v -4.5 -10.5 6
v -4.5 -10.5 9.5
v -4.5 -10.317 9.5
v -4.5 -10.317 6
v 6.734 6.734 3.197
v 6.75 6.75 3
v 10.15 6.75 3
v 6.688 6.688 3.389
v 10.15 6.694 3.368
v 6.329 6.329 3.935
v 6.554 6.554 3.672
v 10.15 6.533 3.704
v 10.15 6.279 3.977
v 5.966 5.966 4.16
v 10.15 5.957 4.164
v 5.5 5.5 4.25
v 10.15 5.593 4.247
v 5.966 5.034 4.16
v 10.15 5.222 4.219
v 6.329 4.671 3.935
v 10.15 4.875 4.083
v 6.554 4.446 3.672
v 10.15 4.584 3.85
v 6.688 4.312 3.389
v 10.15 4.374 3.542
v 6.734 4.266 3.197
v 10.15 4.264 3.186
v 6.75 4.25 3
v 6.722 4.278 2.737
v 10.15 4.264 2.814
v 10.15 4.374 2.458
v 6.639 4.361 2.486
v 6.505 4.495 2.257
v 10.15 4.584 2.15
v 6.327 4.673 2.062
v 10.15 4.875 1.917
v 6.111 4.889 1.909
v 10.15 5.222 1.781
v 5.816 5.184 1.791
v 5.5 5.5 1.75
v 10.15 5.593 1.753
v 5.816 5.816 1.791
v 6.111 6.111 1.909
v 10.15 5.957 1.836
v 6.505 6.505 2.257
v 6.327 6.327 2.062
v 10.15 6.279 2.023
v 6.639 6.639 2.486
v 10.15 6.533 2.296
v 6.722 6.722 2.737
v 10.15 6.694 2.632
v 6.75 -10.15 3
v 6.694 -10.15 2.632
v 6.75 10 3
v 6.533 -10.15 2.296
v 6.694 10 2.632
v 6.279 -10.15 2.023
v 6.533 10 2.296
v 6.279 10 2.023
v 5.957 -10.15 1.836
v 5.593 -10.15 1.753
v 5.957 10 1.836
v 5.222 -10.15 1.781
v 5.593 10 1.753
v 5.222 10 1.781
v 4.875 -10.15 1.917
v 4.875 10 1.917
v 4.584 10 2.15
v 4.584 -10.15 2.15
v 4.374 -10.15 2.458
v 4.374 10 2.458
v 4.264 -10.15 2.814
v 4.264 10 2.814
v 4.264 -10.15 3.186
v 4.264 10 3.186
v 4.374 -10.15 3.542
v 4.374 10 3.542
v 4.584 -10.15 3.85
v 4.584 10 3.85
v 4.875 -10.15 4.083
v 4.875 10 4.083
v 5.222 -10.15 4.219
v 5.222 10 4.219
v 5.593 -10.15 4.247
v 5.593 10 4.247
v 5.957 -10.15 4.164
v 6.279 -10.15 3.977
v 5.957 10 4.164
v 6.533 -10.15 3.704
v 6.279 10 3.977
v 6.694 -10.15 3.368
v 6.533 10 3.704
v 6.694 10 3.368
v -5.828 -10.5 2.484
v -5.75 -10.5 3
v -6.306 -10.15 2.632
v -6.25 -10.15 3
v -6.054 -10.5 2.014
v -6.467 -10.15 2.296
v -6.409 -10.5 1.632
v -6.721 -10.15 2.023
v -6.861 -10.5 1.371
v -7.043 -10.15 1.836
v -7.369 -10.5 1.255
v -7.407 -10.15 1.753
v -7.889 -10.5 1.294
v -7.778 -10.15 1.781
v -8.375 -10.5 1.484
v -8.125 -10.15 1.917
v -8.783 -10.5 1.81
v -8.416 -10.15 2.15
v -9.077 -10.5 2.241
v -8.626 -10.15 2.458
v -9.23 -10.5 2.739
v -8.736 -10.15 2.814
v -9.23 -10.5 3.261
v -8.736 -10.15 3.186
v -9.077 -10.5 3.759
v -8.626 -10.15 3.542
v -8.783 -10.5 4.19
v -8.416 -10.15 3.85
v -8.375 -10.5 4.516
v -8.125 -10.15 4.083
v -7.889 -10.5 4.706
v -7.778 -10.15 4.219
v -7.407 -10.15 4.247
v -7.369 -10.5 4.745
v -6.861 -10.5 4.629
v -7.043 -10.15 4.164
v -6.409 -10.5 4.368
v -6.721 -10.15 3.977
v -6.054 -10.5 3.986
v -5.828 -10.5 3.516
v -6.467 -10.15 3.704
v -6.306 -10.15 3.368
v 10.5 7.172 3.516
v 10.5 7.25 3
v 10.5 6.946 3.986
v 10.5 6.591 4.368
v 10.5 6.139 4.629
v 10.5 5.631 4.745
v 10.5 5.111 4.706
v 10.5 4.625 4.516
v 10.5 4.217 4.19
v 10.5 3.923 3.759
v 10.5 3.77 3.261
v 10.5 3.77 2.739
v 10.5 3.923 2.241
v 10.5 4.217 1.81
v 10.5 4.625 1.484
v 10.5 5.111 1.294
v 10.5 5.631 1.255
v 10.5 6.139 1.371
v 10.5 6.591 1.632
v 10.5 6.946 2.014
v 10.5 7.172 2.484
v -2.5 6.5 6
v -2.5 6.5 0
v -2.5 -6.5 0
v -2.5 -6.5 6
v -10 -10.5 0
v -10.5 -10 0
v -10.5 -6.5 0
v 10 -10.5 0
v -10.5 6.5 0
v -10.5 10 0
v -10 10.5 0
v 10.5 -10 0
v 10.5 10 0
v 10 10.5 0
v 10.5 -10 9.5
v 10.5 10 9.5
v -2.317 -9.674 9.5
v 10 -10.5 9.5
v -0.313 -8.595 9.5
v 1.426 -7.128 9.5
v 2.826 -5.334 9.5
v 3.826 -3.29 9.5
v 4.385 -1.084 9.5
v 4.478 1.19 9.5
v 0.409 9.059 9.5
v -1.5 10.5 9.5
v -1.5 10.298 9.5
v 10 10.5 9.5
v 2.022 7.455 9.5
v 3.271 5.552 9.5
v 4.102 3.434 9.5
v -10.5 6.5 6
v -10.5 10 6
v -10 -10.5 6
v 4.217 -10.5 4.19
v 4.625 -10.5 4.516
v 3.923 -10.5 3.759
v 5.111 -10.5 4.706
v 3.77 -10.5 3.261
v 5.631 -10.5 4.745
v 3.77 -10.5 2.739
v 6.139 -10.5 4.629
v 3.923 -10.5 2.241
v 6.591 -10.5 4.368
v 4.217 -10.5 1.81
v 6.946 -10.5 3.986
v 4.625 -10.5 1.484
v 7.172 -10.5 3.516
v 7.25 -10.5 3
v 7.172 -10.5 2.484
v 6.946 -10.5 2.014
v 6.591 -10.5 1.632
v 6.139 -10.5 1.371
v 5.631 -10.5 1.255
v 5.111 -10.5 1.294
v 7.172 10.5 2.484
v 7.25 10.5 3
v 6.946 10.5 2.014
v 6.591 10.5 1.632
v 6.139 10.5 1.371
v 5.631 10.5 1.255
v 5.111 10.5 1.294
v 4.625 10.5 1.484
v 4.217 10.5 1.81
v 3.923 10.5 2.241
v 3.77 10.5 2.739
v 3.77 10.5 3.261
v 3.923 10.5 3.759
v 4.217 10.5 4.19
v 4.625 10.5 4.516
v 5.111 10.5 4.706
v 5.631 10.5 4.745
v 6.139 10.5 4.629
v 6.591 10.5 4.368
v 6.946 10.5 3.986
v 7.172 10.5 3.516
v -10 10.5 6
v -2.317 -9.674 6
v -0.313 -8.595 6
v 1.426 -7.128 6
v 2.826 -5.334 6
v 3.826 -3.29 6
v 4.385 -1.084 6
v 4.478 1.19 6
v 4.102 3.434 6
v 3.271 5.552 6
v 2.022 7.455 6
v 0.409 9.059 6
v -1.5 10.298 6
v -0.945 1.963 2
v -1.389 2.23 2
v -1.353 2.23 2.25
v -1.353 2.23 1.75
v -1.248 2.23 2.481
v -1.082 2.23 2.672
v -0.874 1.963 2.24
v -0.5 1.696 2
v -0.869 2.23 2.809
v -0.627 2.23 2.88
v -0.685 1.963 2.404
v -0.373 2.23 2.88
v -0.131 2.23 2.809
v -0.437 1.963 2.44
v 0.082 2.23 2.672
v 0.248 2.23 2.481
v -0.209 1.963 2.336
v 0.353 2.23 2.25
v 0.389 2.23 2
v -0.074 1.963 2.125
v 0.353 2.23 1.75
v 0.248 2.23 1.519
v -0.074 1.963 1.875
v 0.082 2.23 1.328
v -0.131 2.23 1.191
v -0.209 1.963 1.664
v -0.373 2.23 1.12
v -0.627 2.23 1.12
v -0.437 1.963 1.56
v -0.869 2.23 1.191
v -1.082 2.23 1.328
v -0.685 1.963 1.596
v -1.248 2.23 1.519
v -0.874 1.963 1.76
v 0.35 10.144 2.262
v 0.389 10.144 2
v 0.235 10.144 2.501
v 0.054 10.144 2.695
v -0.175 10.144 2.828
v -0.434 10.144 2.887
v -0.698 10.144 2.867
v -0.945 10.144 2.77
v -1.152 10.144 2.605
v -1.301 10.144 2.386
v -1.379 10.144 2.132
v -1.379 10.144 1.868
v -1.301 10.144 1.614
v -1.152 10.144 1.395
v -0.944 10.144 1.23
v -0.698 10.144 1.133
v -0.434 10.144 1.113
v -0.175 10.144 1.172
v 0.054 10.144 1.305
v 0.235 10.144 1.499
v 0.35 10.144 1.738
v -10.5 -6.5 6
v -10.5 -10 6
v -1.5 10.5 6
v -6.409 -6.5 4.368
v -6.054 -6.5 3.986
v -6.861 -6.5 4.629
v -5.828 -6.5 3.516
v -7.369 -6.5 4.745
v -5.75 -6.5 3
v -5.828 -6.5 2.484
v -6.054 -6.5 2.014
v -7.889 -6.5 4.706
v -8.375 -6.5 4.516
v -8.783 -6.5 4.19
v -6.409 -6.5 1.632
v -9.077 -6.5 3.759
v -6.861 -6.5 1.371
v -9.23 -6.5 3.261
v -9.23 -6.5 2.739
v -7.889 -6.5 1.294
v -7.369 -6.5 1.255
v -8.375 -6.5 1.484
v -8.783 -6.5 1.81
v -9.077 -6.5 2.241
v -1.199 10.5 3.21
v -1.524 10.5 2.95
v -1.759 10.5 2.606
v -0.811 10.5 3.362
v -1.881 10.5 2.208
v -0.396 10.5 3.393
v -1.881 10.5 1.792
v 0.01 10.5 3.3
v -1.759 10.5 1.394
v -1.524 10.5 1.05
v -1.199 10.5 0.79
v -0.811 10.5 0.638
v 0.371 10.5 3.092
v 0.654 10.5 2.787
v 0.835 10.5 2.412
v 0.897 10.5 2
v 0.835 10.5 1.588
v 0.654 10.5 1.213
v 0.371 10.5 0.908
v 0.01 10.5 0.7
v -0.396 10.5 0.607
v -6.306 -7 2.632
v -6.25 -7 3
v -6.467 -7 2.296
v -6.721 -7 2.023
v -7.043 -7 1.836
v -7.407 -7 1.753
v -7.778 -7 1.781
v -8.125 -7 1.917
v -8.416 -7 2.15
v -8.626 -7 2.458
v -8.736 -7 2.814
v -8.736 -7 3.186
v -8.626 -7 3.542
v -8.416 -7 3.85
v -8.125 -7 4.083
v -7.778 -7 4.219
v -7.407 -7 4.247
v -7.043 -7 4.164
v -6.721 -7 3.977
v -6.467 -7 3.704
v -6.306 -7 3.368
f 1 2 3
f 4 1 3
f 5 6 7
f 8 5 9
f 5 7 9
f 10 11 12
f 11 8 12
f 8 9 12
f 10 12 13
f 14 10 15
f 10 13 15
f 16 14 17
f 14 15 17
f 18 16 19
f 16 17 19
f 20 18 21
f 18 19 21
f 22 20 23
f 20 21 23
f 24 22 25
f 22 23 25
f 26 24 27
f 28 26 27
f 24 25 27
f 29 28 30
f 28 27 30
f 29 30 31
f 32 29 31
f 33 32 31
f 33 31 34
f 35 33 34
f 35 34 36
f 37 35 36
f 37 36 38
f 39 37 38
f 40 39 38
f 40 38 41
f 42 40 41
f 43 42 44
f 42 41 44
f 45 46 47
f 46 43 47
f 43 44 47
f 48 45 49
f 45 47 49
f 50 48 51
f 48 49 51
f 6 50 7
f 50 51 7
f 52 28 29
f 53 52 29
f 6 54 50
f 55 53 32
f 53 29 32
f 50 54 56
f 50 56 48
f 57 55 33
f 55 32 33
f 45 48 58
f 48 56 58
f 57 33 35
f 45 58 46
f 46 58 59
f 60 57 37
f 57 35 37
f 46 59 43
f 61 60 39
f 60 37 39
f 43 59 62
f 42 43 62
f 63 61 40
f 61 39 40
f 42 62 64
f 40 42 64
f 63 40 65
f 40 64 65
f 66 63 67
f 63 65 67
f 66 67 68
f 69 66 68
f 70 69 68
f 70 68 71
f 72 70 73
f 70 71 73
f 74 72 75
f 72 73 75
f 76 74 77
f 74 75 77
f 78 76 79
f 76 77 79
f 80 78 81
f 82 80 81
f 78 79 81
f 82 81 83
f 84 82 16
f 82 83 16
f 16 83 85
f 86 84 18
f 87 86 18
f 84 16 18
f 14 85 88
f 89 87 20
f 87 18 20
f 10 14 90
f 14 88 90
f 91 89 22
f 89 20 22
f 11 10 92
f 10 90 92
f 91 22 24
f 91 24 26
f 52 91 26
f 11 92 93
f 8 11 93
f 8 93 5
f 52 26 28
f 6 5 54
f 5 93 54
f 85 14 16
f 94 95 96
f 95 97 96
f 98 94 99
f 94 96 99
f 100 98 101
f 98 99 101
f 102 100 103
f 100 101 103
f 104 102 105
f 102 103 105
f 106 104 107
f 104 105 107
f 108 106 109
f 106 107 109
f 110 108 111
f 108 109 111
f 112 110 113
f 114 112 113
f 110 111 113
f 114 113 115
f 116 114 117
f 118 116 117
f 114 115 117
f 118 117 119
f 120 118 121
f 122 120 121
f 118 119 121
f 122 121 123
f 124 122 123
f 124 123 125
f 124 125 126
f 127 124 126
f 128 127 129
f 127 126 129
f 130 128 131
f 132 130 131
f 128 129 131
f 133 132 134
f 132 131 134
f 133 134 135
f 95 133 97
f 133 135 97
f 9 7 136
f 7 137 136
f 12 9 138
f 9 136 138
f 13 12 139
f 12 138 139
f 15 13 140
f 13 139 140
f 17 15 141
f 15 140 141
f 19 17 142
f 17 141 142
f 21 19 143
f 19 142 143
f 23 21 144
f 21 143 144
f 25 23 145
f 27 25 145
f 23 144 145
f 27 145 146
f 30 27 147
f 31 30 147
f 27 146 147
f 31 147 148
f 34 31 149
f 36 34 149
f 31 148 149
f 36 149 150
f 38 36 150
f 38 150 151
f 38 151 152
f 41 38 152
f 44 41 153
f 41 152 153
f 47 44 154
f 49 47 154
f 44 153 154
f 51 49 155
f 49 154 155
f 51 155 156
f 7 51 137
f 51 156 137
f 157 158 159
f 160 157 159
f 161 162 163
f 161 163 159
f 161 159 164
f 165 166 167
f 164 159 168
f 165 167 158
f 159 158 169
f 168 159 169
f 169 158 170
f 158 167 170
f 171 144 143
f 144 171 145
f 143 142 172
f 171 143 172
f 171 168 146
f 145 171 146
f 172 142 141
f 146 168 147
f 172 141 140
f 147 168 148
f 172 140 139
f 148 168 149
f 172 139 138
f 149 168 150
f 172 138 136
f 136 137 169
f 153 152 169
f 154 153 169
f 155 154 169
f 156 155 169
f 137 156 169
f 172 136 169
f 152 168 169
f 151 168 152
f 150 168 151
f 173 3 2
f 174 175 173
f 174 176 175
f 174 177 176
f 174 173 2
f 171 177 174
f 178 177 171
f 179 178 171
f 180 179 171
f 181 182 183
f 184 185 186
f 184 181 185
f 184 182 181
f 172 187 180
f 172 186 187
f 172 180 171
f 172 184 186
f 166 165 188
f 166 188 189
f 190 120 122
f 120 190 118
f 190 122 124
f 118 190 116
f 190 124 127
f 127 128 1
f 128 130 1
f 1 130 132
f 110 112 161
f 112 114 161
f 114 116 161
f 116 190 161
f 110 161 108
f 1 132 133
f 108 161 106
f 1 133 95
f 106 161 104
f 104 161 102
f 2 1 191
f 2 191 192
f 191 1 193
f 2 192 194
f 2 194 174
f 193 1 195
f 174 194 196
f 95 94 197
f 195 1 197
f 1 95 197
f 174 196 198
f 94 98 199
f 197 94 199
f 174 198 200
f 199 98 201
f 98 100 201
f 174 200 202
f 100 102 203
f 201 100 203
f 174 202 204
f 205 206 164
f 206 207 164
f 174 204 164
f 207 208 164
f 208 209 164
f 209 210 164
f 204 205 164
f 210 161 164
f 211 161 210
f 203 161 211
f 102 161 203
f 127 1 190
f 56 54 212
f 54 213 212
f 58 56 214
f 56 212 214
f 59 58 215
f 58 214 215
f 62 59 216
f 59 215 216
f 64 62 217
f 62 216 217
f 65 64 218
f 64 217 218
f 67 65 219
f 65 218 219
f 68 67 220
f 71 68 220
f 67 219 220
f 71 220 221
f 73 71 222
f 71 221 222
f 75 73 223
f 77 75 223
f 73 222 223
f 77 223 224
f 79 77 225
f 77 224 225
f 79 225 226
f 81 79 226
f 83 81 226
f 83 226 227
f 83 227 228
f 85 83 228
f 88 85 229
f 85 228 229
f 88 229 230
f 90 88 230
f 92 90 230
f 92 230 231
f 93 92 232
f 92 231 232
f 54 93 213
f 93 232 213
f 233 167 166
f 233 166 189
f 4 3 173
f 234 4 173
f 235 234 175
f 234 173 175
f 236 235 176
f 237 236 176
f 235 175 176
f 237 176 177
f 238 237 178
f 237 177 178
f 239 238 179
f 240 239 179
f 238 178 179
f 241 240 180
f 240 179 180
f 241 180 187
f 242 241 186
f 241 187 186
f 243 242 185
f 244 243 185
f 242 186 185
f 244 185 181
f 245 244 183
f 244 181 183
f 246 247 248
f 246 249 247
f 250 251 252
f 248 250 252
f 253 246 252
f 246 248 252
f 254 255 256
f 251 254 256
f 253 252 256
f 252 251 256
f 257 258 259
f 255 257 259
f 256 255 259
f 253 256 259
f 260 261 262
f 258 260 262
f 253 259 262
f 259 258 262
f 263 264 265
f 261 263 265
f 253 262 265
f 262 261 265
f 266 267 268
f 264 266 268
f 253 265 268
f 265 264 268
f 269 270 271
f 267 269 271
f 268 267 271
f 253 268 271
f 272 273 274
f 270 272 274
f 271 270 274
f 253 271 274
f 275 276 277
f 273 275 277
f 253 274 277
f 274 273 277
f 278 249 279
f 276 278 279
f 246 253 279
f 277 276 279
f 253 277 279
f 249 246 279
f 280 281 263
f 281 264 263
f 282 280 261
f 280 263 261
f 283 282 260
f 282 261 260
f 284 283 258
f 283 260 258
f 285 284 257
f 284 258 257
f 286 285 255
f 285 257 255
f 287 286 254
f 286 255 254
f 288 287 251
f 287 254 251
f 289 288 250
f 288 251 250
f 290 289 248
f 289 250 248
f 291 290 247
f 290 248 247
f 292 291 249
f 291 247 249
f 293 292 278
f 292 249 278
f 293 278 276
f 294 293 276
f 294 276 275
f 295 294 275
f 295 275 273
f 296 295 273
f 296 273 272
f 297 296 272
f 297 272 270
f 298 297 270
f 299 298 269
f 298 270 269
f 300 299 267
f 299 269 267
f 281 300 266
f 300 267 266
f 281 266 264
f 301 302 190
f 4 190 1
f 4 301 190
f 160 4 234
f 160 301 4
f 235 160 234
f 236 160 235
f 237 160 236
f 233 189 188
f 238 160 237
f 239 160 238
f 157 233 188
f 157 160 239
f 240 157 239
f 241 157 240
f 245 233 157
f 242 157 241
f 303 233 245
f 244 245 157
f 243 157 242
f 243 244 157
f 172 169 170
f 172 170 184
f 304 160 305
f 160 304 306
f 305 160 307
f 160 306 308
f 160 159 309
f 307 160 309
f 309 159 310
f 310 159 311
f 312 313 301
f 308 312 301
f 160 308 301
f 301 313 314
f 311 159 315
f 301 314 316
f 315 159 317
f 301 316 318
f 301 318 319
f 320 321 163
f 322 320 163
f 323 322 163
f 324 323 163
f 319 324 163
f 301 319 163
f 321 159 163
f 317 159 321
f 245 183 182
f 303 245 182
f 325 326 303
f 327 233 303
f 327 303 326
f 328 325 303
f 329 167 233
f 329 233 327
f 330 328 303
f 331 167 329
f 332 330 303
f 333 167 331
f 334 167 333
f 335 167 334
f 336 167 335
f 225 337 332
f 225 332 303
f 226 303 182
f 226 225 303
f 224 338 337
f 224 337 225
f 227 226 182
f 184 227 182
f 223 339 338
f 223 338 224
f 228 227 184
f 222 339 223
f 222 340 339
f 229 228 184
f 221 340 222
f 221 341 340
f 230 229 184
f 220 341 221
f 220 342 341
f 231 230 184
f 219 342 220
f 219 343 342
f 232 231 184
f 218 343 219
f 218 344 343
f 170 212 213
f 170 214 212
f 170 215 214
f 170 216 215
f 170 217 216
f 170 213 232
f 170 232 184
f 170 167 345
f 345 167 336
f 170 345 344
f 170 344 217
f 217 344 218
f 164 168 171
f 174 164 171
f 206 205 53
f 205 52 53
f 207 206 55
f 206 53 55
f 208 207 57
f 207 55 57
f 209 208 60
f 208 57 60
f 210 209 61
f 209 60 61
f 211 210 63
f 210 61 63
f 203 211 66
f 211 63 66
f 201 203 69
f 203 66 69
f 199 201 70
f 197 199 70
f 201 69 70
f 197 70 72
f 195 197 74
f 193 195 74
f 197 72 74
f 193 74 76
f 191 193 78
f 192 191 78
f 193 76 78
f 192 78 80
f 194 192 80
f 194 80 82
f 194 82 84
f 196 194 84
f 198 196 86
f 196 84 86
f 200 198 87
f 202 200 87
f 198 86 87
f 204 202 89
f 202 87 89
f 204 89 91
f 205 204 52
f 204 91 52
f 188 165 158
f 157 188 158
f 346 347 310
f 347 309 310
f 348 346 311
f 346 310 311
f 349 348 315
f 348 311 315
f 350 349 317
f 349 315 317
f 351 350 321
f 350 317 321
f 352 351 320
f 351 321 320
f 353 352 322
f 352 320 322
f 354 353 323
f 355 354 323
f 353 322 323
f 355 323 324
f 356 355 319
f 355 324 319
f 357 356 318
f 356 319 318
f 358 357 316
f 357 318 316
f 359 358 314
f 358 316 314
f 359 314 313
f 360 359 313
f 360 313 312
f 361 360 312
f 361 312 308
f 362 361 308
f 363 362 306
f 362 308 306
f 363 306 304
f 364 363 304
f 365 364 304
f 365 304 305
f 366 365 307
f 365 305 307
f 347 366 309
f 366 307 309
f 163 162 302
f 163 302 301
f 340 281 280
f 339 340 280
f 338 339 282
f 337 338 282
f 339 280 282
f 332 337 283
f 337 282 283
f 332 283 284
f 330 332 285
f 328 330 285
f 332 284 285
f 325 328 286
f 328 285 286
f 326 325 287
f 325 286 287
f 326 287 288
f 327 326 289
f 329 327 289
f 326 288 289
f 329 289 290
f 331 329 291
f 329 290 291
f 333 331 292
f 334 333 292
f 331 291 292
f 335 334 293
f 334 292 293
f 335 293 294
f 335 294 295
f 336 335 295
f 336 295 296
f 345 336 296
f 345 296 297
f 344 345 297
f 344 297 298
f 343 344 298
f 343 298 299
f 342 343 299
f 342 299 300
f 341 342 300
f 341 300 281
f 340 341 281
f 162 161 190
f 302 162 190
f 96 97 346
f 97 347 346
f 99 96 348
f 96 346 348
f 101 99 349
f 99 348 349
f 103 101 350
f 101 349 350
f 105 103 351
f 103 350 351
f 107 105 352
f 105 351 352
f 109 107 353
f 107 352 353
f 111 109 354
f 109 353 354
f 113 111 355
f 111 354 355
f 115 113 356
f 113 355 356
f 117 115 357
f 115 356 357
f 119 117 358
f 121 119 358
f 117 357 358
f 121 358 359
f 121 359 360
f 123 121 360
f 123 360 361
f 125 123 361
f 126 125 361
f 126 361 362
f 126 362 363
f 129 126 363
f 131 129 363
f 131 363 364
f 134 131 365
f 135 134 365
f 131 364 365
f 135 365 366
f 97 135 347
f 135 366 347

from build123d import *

# Parameters (mm, degrees)
SKETCH_1_W                    = 21
SKETCH_1_H                    = 21
EXTRUDE_1_DEPTH               = 9.5
CUT_EXTRUDE_3_DEPTH           = 3.5
CUT_EXTRUDE_4_DEPTH           = 18.628102564
CHAMFER_1_SIZE                = 0.5
HOLE_WIZARD_2_561_D           = 1.778
HOLE_WIZARD_2_561_DEPTH       = 8.27
HOLE_WIZARD_2_561_CSINK_D     = 2.794
HOLE_WIZARD_2_561_CSINK_ANGLE = 110
HOLE_WIZARD_2_561_TIP         = 0.53416509


# Read off the part's stored shape, not the designer's step: Отверстие обработанное метчиком M31, Отверстие обработанное метчиком M32
with BuildPart() as part:
    # Эскиз1 → Бобышка-Вытянуть1 (new body)
    with BuildSketch(Plane.XY):
        Rectangle(SKETCH_1_W, SKETCH_1_H)
    extrude(amount=EXTRUDE_1_DEPTH)

    # Эскиз2 → Вырез-Вытянуть3 (cut)
    with BuildSketch(Plane.XY.offset(9.5)):
        with BuildLine():
            ThreePointArc((-4.5, -10.316653826), (4.385337165, -1.084119567), (-1.5, 10.297958971))
            Line((-1.5, 10.297958971), (-1.5, 10.5))
            Line((-1.5, 10.5), (-10.5, 10.5))
            Line((-10.5, 10.5), (-10.5, -10.5))
            Line((-10.5, -10.5), (-4.5, -10.5))
            Line((-4.5, -10.5), (-4.5, -10.316653826))
        make_face()
    extrude(amount=-CUT_EXTRUDE_3_DEPTH, mode=Mode.SUBTRACT)

    # Эскиз3 → Вырез-Вытянуть4 (cut, through all)
    with BuildSketch(Plane(origin=(0, 0, 0), x_dir=(-1, 0, 0), z_dir=(0, 0, -1))):
        Polygon((74.537024344, 6.5), (10.5, 6.5), (2.5, 6.5), (2.5, -6.5), (10.5, -6.5), (74.537024344, -6.5), (202.611073033, -6.5), (202.611073033, 6.5), align=None)
    extrude(amount=-CUT_EXTRUDE_4_DEPTH, mode=Mode.SUBTRACT)

    # Отверстие обработанное метчиком M31 outline → Отверстие обработанное метчиком M31 (revolve, cut)
    with BuildSketch(Plane(origin=(5.5, 0, 3), x_dir=(1, 0, 0), z_dir=(0, 0, 1))):
        Polygon((1.75, 10.5), (0, 10.5), (0, -10.5), (1.75, -10.5), (1.25, -10.149896231), (1.25, 10), align=None)
    revolve(axis=Axis((5.5, 0, 3), (0, 1, 0)), mode=Mode.SUBTRACT)

    # Hole Wizard M31 2 outline → Hole Wizard M31 2 (revolve, cut)
    with BuildSketch(Plane(origin=(-7.5, 0, 3), x_dir=(1, 0, 0), z_dir=(0, 0, 1))):
        Polygon((1.75, -6.5), (0, -6.5), (0, -10.5), (1.75, -10.5), (1.25, -10.149896231), (1.25, -7), align=None)
    revolve(axis=Axis((-7.5, 0, 3), (0, 1, 0)), mode=Mode.SUBTRACT)

    # Фаска1
    chamfer_1_edges = [part.edges().sort_by_distance(p)[0] for p in [
        (-10.5, -10.5, 3),
        (-10.5, 10.5, 3),
        (10.5, -10.5, 4.75),
        (10.5, 10.5, 4.75),
    ]]
    chamfer(chamfer_1_edges, length=CHAMFER_1_SIZE)

    # Отверстие обработанное метчиком #2-561
    with Locations(Plane(origin=(0, 10.5, 0), x_dir=(-1, 0, 0), z_dir=(0, 1, 0))):
        with Locations((0.5, 2)):
            CounterSinkHole(HOLE_WIZARD_2_561_D / 2, HOLE_WIZARD_2_561_CSINK_D / 2, depth=HOLE_WIZARD_2_561_DEPTH, counter_sink_angle=HOLE_WIZARD_2_561_CSINK_ANGLE)
            with Locations((0, 0, -(HOLE_WIZARD_2_561_DEPTH + HOLE_WIZARD_2_561_TIP / 2))):  # 118° drill point
                Cone(0, HOLE_WIZARD_2_561_D / 2, HOLE_WIZARD_2_561_TIP, mode=Mode.SUBTRACT)

    # Отверстие обработанное метчиком M32 outline → Отверстие обработанное метчиком M32 (revolve, cut)
    with BuildSketch(Plane(origin=(0, 5.5, 3), x_dir=(0, 1, 0), z_dir=(0, 0, -1))):
        Polygon((0, 5.5), (1.25, 5.5), (1.25, 10.149896231), (1.75, 10.5), (0, 10.5), align=None)
    revolve(axis=Axis((0, 5.5, 3), (1, 0, 0)), mode=Mode.SUBTRACT)


solid = part.part
